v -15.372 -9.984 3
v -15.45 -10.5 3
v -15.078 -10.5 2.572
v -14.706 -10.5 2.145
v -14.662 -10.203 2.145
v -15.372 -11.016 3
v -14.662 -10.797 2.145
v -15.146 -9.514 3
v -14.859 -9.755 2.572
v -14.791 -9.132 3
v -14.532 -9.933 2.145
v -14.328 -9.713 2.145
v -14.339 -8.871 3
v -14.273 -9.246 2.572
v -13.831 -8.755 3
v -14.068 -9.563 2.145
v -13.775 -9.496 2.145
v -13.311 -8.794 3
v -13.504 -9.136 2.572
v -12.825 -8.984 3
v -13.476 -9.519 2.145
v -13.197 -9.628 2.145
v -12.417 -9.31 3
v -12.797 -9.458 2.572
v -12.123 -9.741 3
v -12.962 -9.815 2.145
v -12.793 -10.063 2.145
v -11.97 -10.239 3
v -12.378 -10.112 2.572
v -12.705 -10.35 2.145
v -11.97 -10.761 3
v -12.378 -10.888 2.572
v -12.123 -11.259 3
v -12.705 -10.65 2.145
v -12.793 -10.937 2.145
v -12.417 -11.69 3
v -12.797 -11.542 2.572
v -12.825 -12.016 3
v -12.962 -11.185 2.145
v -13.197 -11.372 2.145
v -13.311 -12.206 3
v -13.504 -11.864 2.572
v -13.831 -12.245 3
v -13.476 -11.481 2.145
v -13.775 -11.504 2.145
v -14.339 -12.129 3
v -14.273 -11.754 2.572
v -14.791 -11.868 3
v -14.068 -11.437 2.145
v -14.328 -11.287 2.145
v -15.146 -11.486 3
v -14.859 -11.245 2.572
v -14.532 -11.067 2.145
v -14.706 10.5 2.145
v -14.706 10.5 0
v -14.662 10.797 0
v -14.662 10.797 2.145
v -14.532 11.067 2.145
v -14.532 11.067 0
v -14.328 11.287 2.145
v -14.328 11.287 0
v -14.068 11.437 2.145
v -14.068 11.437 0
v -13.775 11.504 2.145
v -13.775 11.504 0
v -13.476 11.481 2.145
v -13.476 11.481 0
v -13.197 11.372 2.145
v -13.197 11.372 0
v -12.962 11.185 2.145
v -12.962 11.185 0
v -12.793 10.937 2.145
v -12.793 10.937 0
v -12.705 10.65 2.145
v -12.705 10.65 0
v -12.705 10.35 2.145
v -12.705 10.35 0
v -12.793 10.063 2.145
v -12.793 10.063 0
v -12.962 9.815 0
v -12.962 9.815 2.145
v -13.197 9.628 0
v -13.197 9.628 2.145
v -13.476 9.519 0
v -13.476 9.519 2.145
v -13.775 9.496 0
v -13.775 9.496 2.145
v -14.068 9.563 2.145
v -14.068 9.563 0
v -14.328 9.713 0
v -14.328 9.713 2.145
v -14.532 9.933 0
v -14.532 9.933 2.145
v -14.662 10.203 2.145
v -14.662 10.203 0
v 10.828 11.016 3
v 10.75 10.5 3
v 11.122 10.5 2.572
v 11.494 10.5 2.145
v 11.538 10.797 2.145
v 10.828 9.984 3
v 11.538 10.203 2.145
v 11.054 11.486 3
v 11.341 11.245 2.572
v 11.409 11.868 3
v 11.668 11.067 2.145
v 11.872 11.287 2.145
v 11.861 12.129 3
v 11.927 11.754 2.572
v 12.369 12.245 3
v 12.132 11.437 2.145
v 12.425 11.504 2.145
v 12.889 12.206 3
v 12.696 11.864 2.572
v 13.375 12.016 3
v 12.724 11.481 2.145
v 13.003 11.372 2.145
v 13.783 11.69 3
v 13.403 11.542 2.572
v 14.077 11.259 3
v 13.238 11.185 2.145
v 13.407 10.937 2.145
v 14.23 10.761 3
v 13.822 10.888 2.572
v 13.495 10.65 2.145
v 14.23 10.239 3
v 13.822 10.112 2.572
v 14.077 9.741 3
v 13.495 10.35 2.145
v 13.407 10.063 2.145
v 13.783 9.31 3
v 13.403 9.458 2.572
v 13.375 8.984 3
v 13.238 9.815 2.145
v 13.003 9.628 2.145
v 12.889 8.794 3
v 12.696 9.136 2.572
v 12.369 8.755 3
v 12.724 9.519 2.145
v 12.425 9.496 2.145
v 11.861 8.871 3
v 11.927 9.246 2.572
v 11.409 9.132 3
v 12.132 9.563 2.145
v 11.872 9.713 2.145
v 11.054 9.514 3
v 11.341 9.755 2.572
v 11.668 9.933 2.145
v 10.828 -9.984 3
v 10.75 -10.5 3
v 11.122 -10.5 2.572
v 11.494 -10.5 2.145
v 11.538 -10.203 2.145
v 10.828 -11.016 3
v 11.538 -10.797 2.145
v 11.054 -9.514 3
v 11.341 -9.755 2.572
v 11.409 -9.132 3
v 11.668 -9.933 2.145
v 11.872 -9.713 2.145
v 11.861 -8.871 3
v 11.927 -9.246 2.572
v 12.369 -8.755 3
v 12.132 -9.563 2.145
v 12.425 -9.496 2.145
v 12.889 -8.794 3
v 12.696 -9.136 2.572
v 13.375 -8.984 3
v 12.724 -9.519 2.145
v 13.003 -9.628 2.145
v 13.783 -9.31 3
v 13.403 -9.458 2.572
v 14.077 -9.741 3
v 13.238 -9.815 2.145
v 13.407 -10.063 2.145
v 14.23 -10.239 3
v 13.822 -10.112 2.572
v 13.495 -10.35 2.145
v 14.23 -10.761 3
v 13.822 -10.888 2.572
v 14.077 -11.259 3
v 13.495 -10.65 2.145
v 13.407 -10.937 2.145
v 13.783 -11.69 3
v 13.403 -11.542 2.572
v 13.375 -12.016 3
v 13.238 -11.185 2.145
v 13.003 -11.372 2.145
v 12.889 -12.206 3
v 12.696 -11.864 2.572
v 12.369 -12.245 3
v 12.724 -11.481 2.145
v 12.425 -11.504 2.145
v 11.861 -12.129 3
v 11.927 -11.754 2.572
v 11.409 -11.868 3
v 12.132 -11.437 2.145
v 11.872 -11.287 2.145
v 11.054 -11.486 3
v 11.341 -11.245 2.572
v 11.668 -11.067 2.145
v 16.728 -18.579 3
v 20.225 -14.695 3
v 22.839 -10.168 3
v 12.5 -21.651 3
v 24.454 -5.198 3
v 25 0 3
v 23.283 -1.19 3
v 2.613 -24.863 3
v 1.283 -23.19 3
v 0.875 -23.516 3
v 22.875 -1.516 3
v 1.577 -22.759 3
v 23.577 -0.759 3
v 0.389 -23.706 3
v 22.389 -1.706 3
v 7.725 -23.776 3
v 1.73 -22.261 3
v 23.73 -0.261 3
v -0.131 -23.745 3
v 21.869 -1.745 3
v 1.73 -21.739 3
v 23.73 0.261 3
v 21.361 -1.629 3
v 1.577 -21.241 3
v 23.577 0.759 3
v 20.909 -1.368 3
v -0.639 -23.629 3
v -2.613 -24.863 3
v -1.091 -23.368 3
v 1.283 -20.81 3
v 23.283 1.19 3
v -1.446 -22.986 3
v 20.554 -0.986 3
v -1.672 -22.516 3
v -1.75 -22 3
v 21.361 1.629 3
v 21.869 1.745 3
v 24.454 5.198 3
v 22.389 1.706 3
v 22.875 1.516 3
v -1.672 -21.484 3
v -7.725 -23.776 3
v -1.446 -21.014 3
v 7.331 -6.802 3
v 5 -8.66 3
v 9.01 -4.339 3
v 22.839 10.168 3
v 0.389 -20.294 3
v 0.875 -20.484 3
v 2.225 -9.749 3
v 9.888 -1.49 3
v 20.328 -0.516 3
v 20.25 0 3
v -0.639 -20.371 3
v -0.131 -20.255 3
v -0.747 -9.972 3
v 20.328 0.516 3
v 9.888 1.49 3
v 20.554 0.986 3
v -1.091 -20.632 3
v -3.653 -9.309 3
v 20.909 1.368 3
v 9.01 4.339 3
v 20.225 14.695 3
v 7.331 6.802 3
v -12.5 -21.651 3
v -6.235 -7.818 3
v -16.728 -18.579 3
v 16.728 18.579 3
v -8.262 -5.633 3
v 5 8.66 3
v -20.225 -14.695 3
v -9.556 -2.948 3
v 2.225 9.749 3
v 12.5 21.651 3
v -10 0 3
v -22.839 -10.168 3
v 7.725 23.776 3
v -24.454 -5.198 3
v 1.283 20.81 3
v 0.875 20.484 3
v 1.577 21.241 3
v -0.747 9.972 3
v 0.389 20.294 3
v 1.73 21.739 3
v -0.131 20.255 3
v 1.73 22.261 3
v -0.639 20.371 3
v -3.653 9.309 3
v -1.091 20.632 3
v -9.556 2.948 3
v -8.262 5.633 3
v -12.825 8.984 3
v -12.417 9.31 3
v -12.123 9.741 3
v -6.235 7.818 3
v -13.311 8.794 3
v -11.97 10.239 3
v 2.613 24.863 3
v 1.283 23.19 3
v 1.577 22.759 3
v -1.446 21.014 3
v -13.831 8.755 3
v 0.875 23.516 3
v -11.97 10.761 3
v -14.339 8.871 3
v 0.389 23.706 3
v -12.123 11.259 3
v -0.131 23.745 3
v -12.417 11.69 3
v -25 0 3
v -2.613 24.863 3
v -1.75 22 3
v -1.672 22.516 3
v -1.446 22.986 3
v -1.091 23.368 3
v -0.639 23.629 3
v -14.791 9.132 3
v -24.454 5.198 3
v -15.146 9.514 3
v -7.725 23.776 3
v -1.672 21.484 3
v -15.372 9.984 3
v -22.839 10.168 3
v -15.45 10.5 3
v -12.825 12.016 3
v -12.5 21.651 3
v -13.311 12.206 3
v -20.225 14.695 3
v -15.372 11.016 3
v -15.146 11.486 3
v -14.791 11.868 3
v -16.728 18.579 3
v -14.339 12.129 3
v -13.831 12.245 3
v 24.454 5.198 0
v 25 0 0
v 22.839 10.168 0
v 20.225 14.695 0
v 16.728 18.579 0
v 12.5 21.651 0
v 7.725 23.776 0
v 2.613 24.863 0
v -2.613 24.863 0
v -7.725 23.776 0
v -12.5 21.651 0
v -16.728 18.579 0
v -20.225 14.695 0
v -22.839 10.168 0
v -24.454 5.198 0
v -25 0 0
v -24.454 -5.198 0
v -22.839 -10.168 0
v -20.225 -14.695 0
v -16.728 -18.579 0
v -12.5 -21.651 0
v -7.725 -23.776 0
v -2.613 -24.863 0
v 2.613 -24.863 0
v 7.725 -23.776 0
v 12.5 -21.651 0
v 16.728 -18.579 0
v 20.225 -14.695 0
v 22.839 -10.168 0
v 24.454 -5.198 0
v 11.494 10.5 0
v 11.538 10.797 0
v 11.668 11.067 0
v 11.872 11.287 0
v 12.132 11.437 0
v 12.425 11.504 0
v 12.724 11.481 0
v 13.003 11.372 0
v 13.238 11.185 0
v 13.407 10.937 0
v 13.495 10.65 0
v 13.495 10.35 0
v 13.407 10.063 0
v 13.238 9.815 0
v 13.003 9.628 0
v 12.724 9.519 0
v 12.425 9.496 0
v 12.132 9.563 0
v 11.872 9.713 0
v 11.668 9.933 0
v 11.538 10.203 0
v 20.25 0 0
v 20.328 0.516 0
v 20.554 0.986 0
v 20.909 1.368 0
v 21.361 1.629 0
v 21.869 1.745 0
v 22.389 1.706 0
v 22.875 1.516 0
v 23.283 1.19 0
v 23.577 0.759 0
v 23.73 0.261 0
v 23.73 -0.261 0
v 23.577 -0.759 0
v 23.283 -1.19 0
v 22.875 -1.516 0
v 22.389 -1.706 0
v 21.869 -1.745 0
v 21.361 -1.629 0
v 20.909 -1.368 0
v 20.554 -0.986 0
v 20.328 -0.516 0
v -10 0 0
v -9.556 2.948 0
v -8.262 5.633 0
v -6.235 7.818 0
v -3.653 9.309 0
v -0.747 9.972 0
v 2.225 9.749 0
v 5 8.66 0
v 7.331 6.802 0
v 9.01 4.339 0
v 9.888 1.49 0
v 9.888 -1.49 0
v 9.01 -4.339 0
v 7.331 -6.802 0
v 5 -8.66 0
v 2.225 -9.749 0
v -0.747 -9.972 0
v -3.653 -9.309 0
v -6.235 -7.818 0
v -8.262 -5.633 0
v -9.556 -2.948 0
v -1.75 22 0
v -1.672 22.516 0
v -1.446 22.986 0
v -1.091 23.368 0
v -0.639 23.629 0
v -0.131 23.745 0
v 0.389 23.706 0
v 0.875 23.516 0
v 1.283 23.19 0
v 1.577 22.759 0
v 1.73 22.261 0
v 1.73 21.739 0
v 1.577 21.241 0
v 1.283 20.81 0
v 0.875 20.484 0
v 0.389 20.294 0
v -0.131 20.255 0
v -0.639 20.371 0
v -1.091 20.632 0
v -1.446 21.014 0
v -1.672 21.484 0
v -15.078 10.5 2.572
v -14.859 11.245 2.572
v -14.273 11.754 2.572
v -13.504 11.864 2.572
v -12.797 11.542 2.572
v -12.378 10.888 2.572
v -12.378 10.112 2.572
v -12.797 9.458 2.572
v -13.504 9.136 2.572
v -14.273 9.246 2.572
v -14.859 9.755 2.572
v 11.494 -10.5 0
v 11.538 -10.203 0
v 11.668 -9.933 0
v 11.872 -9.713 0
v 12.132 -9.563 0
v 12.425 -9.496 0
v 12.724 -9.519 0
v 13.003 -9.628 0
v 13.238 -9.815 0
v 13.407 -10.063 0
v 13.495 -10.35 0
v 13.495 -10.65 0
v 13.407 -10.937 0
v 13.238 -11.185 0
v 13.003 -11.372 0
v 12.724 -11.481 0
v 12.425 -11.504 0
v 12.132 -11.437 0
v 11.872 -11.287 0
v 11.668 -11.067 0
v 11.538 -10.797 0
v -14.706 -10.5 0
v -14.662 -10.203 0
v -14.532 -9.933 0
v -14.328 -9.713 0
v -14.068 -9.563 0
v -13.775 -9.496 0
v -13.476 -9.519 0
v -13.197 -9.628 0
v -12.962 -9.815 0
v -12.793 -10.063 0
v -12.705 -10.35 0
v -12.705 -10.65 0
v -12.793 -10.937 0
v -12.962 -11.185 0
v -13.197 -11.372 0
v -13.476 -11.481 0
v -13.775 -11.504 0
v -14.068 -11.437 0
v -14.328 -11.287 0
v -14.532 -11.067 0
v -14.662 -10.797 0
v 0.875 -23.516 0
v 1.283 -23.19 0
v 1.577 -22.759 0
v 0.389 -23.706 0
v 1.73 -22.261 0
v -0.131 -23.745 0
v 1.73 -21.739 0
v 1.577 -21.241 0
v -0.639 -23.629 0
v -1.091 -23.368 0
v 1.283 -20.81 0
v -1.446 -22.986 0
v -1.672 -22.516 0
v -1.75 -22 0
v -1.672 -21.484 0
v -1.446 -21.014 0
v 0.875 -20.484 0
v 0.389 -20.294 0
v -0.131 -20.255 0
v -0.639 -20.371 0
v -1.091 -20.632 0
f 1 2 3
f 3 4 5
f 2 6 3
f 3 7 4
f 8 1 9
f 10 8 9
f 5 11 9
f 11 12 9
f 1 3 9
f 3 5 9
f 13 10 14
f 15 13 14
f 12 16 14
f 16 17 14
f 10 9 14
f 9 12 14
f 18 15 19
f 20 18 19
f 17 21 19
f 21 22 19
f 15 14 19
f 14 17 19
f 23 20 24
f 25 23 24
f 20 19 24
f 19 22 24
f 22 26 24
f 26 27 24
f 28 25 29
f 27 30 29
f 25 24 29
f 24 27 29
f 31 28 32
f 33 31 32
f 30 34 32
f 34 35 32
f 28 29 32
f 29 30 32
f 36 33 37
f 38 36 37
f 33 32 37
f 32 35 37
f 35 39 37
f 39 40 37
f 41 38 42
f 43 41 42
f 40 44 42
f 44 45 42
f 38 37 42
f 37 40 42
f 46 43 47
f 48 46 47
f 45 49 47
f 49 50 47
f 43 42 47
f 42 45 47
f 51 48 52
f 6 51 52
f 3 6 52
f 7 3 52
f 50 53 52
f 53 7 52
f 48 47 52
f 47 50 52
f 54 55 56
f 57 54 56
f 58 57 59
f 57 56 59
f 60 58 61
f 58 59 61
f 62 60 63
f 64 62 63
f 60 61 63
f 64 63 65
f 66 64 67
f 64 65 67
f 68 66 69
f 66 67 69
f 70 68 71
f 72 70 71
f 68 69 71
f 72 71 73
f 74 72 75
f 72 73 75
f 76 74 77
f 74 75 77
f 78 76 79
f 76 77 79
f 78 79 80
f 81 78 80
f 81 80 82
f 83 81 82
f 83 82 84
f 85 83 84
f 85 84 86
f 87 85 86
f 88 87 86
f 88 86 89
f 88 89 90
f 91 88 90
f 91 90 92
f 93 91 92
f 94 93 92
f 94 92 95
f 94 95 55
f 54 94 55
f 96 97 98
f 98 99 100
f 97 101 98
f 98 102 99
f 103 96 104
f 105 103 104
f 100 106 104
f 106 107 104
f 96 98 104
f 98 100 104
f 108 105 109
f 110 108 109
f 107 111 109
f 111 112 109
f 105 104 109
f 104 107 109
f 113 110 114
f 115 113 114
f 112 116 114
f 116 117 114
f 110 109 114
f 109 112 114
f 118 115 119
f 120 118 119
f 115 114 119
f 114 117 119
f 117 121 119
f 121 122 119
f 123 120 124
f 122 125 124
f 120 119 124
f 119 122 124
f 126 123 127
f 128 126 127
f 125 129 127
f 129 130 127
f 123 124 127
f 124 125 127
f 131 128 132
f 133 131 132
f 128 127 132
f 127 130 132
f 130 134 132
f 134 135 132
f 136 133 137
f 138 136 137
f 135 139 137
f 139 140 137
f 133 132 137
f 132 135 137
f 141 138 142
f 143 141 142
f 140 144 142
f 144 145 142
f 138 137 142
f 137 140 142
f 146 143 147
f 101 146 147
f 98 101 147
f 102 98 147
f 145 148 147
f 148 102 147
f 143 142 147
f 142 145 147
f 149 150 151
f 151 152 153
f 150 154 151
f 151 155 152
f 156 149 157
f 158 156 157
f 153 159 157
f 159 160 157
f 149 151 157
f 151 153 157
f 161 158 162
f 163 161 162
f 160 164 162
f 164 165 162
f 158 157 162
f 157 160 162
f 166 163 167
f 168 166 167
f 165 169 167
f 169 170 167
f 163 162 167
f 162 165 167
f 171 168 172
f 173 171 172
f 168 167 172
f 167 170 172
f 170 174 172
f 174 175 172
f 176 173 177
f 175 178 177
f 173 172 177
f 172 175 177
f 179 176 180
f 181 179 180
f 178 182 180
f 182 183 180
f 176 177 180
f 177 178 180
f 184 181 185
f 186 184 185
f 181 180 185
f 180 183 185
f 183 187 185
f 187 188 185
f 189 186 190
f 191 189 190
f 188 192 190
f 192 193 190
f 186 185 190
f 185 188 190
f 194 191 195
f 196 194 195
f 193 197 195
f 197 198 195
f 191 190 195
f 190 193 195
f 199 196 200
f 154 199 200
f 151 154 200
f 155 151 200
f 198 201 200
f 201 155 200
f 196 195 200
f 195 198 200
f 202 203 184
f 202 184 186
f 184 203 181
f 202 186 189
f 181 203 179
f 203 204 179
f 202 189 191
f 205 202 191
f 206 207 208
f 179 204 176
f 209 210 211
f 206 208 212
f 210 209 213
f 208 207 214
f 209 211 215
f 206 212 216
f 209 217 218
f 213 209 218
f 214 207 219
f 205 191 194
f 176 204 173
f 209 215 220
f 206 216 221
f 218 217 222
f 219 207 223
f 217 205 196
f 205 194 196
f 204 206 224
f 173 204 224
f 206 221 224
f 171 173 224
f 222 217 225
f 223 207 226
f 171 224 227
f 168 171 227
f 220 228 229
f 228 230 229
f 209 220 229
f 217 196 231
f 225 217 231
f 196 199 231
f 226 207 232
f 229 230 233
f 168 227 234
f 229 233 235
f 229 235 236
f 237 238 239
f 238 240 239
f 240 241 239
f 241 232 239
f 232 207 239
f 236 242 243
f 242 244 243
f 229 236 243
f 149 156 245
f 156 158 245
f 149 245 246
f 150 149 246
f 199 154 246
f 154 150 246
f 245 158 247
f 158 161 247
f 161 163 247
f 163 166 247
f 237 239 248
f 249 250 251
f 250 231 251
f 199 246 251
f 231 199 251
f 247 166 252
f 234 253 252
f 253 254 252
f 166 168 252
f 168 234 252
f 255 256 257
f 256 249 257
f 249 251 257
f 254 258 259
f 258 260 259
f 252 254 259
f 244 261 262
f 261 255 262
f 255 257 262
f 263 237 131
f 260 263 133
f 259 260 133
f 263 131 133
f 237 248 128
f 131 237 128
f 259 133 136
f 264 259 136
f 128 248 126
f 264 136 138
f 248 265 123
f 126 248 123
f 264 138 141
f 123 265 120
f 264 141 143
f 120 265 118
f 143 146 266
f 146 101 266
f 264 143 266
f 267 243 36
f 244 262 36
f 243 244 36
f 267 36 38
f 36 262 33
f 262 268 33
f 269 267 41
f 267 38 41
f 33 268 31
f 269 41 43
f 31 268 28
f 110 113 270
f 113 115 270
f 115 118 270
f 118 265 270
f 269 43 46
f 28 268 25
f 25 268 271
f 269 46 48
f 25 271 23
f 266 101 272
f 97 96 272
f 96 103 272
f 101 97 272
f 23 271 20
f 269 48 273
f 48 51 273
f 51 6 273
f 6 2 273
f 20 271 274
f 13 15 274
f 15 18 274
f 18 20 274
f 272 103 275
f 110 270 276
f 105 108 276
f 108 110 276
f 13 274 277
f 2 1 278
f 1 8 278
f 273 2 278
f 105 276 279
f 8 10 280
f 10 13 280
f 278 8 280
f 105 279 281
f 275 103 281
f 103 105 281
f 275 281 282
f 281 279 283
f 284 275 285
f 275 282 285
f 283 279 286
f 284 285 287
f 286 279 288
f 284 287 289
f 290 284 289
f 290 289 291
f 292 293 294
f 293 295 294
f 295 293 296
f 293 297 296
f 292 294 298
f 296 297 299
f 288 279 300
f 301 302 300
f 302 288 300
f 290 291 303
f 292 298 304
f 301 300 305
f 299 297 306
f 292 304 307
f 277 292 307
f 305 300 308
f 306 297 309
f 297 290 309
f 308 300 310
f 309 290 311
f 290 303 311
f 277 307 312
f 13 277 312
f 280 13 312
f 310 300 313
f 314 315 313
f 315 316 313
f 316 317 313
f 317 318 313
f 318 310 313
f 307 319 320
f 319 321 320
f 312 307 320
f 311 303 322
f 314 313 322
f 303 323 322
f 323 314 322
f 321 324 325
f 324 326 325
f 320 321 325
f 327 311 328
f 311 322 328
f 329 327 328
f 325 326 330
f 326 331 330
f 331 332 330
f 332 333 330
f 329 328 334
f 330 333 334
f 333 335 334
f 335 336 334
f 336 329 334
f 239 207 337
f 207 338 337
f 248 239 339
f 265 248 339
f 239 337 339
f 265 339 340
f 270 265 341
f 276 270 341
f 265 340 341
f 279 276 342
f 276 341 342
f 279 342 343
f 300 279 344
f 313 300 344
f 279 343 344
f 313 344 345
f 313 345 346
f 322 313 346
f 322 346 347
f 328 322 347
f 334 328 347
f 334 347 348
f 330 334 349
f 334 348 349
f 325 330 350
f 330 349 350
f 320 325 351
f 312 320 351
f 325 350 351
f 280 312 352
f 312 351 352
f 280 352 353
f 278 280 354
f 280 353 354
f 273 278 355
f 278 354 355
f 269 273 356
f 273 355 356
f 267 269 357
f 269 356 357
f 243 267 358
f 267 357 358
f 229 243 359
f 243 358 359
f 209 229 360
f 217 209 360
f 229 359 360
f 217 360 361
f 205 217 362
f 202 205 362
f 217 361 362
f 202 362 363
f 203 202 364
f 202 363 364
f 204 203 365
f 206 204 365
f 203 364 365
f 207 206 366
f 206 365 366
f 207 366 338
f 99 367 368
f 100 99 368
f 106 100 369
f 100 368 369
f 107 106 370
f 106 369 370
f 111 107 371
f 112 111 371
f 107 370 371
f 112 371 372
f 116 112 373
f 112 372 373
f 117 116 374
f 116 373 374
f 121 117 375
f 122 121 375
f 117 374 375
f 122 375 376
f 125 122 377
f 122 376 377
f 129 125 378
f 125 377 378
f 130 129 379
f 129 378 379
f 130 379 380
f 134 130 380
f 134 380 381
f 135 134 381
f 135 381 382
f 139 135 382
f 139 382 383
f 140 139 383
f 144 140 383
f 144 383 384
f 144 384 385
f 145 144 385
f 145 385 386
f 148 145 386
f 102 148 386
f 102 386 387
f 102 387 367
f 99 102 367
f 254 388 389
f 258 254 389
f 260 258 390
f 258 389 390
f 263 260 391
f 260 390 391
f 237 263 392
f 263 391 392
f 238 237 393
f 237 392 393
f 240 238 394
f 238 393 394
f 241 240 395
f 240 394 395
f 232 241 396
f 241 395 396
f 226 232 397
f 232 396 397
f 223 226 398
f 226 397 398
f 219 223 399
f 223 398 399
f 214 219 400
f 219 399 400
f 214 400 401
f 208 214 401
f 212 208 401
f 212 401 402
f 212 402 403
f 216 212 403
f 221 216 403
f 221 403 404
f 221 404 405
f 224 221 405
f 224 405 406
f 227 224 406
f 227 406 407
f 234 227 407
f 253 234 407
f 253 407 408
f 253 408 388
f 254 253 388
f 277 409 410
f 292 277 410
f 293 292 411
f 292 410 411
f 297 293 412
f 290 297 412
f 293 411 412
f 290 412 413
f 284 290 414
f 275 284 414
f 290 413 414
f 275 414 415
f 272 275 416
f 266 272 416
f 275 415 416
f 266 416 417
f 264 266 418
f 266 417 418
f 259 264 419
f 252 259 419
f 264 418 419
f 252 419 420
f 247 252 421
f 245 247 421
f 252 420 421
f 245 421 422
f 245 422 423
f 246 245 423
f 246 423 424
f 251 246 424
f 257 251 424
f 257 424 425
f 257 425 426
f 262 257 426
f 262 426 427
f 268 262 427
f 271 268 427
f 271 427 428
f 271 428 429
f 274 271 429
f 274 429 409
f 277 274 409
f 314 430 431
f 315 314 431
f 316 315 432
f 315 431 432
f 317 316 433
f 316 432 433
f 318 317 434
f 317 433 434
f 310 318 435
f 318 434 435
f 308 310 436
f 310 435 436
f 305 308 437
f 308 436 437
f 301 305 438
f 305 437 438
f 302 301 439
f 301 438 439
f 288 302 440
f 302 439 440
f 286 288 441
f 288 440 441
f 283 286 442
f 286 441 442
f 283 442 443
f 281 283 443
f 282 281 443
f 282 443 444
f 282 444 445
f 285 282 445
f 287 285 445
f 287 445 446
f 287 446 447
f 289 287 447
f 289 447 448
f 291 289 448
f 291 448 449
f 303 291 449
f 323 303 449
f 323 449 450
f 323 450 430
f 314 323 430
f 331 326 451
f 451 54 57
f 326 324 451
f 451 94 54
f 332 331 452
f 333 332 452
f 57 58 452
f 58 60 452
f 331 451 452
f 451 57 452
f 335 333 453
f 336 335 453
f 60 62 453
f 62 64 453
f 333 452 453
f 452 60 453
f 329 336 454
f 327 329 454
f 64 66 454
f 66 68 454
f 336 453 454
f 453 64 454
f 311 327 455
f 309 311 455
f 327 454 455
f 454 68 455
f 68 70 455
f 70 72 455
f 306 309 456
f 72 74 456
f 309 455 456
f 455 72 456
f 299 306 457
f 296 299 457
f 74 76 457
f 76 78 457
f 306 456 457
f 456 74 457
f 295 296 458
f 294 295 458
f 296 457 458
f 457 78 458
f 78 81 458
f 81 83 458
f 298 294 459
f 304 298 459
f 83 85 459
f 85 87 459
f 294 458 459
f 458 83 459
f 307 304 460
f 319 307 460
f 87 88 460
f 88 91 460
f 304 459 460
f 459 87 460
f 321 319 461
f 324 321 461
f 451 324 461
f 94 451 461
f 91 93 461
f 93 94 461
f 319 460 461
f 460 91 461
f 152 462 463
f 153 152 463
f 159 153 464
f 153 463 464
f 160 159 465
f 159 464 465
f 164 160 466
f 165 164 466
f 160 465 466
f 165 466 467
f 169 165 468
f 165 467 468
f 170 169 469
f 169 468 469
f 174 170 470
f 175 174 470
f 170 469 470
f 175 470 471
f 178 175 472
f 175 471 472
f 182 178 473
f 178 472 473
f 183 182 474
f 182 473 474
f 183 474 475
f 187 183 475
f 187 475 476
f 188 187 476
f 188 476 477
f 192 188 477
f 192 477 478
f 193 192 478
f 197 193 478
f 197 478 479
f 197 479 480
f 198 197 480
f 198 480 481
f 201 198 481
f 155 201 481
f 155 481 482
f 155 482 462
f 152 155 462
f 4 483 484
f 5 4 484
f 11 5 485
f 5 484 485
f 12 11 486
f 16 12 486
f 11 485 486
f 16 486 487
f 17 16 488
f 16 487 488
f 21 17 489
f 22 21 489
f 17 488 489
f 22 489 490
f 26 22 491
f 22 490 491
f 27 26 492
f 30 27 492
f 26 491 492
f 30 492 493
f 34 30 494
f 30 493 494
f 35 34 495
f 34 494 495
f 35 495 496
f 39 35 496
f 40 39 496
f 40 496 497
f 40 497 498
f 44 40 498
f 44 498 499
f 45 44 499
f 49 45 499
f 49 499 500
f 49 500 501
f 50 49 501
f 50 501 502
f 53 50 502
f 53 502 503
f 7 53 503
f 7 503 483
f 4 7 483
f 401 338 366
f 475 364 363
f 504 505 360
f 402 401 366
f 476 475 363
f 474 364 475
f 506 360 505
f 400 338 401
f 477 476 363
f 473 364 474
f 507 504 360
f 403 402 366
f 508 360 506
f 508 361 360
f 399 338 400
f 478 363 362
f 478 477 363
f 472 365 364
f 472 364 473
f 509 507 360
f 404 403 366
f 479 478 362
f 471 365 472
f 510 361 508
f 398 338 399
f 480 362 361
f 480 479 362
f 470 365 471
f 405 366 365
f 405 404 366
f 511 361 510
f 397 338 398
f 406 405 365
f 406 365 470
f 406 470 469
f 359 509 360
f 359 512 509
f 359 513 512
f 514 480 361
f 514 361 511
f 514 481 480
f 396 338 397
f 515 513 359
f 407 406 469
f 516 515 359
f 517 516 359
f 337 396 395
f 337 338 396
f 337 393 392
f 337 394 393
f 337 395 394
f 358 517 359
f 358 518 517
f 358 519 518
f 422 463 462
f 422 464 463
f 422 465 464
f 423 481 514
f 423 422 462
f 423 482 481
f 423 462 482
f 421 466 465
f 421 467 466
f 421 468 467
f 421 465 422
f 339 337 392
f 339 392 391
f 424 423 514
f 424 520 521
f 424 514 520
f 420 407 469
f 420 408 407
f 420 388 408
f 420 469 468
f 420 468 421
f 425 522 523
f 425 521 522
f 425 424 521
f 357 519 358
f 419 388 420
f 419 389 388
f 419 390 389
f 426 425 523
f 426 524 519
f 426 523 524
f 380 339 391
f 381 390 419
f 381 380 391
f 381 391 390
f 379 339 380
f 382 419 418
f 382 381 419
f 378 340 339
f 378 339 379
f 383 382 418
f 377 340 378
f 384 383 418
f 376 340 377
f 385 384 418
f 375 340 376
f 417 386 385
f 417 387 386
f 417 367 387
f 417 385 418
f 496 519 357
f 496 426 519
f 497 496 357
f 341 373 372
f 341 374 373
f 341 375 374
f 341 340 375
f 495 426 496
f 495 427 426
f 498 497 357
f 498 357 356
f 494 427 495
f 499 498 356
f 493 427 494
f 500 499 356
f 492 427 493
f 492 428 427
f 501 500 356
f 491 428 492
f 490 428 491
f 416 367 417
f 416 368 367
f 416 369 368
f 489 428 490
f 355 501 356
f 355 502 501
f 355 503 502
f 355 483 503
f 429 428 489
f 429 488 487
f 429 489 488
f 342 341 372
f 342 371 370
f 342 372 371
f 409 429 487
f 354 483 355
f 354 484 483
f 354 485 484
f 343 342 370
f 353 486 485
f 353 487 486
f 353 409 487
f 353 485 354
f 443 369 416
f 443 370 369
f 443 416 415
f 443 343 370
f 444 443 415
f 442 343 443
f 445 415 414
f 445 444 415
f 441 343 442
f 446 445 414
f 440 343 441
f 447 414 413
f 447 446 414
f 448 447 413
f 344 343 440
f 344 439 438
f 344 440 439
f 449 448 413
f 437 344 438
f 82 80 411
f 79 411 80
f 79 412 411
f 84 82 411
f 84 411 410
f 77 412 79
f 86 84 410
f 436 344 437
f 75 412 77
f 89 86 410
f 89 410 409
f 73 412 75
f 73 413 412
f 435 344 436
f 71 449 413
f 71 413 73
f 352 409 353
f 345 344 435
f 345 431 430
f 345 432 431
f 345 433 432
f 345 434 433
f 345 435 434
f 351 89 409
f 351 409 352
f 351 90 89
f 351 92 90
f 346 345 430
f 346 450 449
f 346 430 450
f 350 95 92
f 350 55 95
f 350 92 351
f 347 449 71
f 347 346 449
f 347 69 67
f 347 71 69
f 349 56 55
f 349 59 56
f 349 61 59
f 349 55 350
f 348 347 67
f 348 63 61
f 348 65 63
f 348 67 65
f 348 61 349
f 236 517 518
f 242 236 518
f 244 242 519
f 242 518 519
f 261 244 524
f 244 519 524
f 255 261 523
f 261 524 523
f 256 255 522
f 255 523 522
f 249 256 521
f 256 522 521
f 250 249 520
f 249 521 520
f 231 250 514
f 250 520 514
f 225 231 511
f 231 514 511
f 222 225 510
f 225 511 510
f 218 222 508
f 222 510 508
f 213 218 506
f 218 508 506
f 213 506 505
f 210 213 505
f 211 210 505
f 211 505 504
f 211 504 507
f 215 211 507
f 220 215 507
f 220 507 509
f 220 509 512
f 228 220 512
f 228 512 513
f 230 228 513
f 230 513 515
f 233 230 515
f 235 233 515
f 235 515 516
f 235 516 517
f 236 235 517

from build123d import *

# Parameters (mm, degrees)
SKETCH_1_W          = 25
SKETCH_1_H          = 3
HOLE_WIZARD_1_D     = 2.013
HOLE_WIZARD_2_D     = 2.013
HOLE_WIZARD_2_DEPTH = 3
HOLE_WIZARD_3_D     = 2.013
HOLE_WIZARD_3_DEPTH = 3
HOLE_WIZARD_4_D     = 2.013
HOLE_WIZARD_4_DEPTH = 3
HOLE_WIZARD_5_D     = 3.5
HOLE_WIZARD_5_DEPTH = 3
HOLE_WIZARD_6_D     = 3.5
HOLE_WIZARD_6_DEPTH = 3
HOLE_WIZARD_7_D     = 20
HOLE_WIZARD_7_DEPTH = 3
HOLE_WIZARD_8_D     = 3.5
HOLE_WIZARD_8_DEPTH = 3
CHAMFER_1_SIZE      = 0.7435
CHAMFER_1_SIZE2     = 0.855298911
CHAMFER_2_SIZE      = 0.7435
CHAMFER_2_SIZE2     = 0.855298911
CHAMFER_3_SIZE      = 0.7435
CHAMFER_3_SIZE2     = 0.855298911
CHAMFER_4_SIZE      = 0.7435
CHAMFER_4_SIZE2     = 0.855298911


with BuildPart() as part:
    # Эскиз1 → Повернуть1 (revolve)
    with BuildSketch(Plane(origin=(0, 0, 0), x_dir=(1, 0, 0), z_dir=(0, 1, 0))):
        with Locations((12.5, -1.5)):
            Rectangle(SKETCH_1_W, SKETCH_1_H)
    revolve(axis=Axis((0, 0, 0), (0, 0, 1)))

    # Отверстие1 (through all)
    with Locations(Plane.XY.offset(3)):
        with Locations((-13.7, -10.5)):
            Hole(HOLE_WIZARD_1_D / 2)

    # Отверстие2
    with Locations(Plane.XY.offset(3)):
        with Locations((12.5, 10.5)):
            Hole(HOLE_WIZARD_2_D / 2, depth=HOLE_WIZARD_2_DEPTH)

    # Отверстие3
    with Locations(Plane.XY.offset(3)):
        with Locations((-13.7, 10.5)):
            Hole(HOLE_WIZARD_3_D / 2, depth=HOLE_WIZARD_3_DEPTH)

    # Отверстие4
    with Locations(Plane.XY.offset(3)):
        with Locations((12.5, -10.5)):
            Hole(HOLE_WIZARD_4_D / 2, depth=HOLE_WIZARD_4_DEPTH)

    # Отверстие5
    with Locations(Plane.XY.offset(3)):
        with Locations((0, -22)):
            Hole(HOLE_WIZARD_5_D / 2, depth=HOLE_WIZARD_5_DEPTH)

    # Отверстие6
    with Locations(Plane.XY.offset(3)):
        with Locations((0, 22)):
            Hole(HOLE_WIZARD_6_D / 2, depth=HOLE_WIZARD_6_DEPTH)

    # Отверстие7
    with Locations(Plane.XY.offset(3)):
        with Locations((0, 0)):
            Hole(HOLE_WIZARD_7_D / 2, depth=HOLE_WIZARD_7_DEPTH)

    # Отверстие8
    with Locations(Plane.XY.offset(3)):
        with Locations((22, 0)):
            Hole(HOLE_WIZARD_8_D / 2, depth=HOLE_WIZARD_8_DEPTH)

    # Фаска1
    chamfer_1_edges = [part.edges().sort_by_distance(p)[0] for p in [
        (-12.6935, 10.5, 3),
    ]]
    chamfer_1_side = [part.faces().sort_by_distance(p)[0] for p in [
        (-24.292893219, 0, 3),
    ]]
    chamfer(chamfer_1_edges, length=CHAMFER_1_SIZE, length2=CHAMFER_1_SIZE2, reference=chamfer_1_side[0])

    # Фаска2
    chamfer_2_edges = [part.edges().sort_by_distance(p)[0] for p in [
        (13.5065, -10.5, 3),
    ]]
    chamfer_2_side = [part.faces().sort_by_distance(p)[0] for p in [
        (-11.242893219, 10.5, 3),
    ]]
    chamfer(chamfer_2_edges, length=CHAMFER_2_SIZE, length2=CHAMFER_2_SIZE2, reference=chamfer_2_side[0])

    # Фаска3
    chamfer_3_edges = [part.edges().sort_by_distance(p)[0] for p in [
        (13.5065, 10.5, 3),
    ]]
    chamfer_3_side = [part.faces().sort_by_distance(p)[0] for p in [
        (14.957106781, -10.5, 3),
    ]]
    chamfer(chamfer_3_edges, length=CHAMFER_3_SIZE, length2=CHAMFER_3_SIZE2, reference=chamfer_3_side[0])

    # Фаска4
    chamfer_4_edges = [part.edges().sort_by_distance(p)[0] for p in [
        (-12.6935, -10.5, 3),
    ]]
    chamfer_4_side = [part.faces().sort_by_distance(p)[0] for p in [
        (14.957106781, 10.5, 3),
    ]]
    chamfer(chamfer_4_edges, length=CHAMFER_4_SIZE, length2=CHAMFER_4_SIZE2, reference=chamfer_4_side[0])


solid = part.part
